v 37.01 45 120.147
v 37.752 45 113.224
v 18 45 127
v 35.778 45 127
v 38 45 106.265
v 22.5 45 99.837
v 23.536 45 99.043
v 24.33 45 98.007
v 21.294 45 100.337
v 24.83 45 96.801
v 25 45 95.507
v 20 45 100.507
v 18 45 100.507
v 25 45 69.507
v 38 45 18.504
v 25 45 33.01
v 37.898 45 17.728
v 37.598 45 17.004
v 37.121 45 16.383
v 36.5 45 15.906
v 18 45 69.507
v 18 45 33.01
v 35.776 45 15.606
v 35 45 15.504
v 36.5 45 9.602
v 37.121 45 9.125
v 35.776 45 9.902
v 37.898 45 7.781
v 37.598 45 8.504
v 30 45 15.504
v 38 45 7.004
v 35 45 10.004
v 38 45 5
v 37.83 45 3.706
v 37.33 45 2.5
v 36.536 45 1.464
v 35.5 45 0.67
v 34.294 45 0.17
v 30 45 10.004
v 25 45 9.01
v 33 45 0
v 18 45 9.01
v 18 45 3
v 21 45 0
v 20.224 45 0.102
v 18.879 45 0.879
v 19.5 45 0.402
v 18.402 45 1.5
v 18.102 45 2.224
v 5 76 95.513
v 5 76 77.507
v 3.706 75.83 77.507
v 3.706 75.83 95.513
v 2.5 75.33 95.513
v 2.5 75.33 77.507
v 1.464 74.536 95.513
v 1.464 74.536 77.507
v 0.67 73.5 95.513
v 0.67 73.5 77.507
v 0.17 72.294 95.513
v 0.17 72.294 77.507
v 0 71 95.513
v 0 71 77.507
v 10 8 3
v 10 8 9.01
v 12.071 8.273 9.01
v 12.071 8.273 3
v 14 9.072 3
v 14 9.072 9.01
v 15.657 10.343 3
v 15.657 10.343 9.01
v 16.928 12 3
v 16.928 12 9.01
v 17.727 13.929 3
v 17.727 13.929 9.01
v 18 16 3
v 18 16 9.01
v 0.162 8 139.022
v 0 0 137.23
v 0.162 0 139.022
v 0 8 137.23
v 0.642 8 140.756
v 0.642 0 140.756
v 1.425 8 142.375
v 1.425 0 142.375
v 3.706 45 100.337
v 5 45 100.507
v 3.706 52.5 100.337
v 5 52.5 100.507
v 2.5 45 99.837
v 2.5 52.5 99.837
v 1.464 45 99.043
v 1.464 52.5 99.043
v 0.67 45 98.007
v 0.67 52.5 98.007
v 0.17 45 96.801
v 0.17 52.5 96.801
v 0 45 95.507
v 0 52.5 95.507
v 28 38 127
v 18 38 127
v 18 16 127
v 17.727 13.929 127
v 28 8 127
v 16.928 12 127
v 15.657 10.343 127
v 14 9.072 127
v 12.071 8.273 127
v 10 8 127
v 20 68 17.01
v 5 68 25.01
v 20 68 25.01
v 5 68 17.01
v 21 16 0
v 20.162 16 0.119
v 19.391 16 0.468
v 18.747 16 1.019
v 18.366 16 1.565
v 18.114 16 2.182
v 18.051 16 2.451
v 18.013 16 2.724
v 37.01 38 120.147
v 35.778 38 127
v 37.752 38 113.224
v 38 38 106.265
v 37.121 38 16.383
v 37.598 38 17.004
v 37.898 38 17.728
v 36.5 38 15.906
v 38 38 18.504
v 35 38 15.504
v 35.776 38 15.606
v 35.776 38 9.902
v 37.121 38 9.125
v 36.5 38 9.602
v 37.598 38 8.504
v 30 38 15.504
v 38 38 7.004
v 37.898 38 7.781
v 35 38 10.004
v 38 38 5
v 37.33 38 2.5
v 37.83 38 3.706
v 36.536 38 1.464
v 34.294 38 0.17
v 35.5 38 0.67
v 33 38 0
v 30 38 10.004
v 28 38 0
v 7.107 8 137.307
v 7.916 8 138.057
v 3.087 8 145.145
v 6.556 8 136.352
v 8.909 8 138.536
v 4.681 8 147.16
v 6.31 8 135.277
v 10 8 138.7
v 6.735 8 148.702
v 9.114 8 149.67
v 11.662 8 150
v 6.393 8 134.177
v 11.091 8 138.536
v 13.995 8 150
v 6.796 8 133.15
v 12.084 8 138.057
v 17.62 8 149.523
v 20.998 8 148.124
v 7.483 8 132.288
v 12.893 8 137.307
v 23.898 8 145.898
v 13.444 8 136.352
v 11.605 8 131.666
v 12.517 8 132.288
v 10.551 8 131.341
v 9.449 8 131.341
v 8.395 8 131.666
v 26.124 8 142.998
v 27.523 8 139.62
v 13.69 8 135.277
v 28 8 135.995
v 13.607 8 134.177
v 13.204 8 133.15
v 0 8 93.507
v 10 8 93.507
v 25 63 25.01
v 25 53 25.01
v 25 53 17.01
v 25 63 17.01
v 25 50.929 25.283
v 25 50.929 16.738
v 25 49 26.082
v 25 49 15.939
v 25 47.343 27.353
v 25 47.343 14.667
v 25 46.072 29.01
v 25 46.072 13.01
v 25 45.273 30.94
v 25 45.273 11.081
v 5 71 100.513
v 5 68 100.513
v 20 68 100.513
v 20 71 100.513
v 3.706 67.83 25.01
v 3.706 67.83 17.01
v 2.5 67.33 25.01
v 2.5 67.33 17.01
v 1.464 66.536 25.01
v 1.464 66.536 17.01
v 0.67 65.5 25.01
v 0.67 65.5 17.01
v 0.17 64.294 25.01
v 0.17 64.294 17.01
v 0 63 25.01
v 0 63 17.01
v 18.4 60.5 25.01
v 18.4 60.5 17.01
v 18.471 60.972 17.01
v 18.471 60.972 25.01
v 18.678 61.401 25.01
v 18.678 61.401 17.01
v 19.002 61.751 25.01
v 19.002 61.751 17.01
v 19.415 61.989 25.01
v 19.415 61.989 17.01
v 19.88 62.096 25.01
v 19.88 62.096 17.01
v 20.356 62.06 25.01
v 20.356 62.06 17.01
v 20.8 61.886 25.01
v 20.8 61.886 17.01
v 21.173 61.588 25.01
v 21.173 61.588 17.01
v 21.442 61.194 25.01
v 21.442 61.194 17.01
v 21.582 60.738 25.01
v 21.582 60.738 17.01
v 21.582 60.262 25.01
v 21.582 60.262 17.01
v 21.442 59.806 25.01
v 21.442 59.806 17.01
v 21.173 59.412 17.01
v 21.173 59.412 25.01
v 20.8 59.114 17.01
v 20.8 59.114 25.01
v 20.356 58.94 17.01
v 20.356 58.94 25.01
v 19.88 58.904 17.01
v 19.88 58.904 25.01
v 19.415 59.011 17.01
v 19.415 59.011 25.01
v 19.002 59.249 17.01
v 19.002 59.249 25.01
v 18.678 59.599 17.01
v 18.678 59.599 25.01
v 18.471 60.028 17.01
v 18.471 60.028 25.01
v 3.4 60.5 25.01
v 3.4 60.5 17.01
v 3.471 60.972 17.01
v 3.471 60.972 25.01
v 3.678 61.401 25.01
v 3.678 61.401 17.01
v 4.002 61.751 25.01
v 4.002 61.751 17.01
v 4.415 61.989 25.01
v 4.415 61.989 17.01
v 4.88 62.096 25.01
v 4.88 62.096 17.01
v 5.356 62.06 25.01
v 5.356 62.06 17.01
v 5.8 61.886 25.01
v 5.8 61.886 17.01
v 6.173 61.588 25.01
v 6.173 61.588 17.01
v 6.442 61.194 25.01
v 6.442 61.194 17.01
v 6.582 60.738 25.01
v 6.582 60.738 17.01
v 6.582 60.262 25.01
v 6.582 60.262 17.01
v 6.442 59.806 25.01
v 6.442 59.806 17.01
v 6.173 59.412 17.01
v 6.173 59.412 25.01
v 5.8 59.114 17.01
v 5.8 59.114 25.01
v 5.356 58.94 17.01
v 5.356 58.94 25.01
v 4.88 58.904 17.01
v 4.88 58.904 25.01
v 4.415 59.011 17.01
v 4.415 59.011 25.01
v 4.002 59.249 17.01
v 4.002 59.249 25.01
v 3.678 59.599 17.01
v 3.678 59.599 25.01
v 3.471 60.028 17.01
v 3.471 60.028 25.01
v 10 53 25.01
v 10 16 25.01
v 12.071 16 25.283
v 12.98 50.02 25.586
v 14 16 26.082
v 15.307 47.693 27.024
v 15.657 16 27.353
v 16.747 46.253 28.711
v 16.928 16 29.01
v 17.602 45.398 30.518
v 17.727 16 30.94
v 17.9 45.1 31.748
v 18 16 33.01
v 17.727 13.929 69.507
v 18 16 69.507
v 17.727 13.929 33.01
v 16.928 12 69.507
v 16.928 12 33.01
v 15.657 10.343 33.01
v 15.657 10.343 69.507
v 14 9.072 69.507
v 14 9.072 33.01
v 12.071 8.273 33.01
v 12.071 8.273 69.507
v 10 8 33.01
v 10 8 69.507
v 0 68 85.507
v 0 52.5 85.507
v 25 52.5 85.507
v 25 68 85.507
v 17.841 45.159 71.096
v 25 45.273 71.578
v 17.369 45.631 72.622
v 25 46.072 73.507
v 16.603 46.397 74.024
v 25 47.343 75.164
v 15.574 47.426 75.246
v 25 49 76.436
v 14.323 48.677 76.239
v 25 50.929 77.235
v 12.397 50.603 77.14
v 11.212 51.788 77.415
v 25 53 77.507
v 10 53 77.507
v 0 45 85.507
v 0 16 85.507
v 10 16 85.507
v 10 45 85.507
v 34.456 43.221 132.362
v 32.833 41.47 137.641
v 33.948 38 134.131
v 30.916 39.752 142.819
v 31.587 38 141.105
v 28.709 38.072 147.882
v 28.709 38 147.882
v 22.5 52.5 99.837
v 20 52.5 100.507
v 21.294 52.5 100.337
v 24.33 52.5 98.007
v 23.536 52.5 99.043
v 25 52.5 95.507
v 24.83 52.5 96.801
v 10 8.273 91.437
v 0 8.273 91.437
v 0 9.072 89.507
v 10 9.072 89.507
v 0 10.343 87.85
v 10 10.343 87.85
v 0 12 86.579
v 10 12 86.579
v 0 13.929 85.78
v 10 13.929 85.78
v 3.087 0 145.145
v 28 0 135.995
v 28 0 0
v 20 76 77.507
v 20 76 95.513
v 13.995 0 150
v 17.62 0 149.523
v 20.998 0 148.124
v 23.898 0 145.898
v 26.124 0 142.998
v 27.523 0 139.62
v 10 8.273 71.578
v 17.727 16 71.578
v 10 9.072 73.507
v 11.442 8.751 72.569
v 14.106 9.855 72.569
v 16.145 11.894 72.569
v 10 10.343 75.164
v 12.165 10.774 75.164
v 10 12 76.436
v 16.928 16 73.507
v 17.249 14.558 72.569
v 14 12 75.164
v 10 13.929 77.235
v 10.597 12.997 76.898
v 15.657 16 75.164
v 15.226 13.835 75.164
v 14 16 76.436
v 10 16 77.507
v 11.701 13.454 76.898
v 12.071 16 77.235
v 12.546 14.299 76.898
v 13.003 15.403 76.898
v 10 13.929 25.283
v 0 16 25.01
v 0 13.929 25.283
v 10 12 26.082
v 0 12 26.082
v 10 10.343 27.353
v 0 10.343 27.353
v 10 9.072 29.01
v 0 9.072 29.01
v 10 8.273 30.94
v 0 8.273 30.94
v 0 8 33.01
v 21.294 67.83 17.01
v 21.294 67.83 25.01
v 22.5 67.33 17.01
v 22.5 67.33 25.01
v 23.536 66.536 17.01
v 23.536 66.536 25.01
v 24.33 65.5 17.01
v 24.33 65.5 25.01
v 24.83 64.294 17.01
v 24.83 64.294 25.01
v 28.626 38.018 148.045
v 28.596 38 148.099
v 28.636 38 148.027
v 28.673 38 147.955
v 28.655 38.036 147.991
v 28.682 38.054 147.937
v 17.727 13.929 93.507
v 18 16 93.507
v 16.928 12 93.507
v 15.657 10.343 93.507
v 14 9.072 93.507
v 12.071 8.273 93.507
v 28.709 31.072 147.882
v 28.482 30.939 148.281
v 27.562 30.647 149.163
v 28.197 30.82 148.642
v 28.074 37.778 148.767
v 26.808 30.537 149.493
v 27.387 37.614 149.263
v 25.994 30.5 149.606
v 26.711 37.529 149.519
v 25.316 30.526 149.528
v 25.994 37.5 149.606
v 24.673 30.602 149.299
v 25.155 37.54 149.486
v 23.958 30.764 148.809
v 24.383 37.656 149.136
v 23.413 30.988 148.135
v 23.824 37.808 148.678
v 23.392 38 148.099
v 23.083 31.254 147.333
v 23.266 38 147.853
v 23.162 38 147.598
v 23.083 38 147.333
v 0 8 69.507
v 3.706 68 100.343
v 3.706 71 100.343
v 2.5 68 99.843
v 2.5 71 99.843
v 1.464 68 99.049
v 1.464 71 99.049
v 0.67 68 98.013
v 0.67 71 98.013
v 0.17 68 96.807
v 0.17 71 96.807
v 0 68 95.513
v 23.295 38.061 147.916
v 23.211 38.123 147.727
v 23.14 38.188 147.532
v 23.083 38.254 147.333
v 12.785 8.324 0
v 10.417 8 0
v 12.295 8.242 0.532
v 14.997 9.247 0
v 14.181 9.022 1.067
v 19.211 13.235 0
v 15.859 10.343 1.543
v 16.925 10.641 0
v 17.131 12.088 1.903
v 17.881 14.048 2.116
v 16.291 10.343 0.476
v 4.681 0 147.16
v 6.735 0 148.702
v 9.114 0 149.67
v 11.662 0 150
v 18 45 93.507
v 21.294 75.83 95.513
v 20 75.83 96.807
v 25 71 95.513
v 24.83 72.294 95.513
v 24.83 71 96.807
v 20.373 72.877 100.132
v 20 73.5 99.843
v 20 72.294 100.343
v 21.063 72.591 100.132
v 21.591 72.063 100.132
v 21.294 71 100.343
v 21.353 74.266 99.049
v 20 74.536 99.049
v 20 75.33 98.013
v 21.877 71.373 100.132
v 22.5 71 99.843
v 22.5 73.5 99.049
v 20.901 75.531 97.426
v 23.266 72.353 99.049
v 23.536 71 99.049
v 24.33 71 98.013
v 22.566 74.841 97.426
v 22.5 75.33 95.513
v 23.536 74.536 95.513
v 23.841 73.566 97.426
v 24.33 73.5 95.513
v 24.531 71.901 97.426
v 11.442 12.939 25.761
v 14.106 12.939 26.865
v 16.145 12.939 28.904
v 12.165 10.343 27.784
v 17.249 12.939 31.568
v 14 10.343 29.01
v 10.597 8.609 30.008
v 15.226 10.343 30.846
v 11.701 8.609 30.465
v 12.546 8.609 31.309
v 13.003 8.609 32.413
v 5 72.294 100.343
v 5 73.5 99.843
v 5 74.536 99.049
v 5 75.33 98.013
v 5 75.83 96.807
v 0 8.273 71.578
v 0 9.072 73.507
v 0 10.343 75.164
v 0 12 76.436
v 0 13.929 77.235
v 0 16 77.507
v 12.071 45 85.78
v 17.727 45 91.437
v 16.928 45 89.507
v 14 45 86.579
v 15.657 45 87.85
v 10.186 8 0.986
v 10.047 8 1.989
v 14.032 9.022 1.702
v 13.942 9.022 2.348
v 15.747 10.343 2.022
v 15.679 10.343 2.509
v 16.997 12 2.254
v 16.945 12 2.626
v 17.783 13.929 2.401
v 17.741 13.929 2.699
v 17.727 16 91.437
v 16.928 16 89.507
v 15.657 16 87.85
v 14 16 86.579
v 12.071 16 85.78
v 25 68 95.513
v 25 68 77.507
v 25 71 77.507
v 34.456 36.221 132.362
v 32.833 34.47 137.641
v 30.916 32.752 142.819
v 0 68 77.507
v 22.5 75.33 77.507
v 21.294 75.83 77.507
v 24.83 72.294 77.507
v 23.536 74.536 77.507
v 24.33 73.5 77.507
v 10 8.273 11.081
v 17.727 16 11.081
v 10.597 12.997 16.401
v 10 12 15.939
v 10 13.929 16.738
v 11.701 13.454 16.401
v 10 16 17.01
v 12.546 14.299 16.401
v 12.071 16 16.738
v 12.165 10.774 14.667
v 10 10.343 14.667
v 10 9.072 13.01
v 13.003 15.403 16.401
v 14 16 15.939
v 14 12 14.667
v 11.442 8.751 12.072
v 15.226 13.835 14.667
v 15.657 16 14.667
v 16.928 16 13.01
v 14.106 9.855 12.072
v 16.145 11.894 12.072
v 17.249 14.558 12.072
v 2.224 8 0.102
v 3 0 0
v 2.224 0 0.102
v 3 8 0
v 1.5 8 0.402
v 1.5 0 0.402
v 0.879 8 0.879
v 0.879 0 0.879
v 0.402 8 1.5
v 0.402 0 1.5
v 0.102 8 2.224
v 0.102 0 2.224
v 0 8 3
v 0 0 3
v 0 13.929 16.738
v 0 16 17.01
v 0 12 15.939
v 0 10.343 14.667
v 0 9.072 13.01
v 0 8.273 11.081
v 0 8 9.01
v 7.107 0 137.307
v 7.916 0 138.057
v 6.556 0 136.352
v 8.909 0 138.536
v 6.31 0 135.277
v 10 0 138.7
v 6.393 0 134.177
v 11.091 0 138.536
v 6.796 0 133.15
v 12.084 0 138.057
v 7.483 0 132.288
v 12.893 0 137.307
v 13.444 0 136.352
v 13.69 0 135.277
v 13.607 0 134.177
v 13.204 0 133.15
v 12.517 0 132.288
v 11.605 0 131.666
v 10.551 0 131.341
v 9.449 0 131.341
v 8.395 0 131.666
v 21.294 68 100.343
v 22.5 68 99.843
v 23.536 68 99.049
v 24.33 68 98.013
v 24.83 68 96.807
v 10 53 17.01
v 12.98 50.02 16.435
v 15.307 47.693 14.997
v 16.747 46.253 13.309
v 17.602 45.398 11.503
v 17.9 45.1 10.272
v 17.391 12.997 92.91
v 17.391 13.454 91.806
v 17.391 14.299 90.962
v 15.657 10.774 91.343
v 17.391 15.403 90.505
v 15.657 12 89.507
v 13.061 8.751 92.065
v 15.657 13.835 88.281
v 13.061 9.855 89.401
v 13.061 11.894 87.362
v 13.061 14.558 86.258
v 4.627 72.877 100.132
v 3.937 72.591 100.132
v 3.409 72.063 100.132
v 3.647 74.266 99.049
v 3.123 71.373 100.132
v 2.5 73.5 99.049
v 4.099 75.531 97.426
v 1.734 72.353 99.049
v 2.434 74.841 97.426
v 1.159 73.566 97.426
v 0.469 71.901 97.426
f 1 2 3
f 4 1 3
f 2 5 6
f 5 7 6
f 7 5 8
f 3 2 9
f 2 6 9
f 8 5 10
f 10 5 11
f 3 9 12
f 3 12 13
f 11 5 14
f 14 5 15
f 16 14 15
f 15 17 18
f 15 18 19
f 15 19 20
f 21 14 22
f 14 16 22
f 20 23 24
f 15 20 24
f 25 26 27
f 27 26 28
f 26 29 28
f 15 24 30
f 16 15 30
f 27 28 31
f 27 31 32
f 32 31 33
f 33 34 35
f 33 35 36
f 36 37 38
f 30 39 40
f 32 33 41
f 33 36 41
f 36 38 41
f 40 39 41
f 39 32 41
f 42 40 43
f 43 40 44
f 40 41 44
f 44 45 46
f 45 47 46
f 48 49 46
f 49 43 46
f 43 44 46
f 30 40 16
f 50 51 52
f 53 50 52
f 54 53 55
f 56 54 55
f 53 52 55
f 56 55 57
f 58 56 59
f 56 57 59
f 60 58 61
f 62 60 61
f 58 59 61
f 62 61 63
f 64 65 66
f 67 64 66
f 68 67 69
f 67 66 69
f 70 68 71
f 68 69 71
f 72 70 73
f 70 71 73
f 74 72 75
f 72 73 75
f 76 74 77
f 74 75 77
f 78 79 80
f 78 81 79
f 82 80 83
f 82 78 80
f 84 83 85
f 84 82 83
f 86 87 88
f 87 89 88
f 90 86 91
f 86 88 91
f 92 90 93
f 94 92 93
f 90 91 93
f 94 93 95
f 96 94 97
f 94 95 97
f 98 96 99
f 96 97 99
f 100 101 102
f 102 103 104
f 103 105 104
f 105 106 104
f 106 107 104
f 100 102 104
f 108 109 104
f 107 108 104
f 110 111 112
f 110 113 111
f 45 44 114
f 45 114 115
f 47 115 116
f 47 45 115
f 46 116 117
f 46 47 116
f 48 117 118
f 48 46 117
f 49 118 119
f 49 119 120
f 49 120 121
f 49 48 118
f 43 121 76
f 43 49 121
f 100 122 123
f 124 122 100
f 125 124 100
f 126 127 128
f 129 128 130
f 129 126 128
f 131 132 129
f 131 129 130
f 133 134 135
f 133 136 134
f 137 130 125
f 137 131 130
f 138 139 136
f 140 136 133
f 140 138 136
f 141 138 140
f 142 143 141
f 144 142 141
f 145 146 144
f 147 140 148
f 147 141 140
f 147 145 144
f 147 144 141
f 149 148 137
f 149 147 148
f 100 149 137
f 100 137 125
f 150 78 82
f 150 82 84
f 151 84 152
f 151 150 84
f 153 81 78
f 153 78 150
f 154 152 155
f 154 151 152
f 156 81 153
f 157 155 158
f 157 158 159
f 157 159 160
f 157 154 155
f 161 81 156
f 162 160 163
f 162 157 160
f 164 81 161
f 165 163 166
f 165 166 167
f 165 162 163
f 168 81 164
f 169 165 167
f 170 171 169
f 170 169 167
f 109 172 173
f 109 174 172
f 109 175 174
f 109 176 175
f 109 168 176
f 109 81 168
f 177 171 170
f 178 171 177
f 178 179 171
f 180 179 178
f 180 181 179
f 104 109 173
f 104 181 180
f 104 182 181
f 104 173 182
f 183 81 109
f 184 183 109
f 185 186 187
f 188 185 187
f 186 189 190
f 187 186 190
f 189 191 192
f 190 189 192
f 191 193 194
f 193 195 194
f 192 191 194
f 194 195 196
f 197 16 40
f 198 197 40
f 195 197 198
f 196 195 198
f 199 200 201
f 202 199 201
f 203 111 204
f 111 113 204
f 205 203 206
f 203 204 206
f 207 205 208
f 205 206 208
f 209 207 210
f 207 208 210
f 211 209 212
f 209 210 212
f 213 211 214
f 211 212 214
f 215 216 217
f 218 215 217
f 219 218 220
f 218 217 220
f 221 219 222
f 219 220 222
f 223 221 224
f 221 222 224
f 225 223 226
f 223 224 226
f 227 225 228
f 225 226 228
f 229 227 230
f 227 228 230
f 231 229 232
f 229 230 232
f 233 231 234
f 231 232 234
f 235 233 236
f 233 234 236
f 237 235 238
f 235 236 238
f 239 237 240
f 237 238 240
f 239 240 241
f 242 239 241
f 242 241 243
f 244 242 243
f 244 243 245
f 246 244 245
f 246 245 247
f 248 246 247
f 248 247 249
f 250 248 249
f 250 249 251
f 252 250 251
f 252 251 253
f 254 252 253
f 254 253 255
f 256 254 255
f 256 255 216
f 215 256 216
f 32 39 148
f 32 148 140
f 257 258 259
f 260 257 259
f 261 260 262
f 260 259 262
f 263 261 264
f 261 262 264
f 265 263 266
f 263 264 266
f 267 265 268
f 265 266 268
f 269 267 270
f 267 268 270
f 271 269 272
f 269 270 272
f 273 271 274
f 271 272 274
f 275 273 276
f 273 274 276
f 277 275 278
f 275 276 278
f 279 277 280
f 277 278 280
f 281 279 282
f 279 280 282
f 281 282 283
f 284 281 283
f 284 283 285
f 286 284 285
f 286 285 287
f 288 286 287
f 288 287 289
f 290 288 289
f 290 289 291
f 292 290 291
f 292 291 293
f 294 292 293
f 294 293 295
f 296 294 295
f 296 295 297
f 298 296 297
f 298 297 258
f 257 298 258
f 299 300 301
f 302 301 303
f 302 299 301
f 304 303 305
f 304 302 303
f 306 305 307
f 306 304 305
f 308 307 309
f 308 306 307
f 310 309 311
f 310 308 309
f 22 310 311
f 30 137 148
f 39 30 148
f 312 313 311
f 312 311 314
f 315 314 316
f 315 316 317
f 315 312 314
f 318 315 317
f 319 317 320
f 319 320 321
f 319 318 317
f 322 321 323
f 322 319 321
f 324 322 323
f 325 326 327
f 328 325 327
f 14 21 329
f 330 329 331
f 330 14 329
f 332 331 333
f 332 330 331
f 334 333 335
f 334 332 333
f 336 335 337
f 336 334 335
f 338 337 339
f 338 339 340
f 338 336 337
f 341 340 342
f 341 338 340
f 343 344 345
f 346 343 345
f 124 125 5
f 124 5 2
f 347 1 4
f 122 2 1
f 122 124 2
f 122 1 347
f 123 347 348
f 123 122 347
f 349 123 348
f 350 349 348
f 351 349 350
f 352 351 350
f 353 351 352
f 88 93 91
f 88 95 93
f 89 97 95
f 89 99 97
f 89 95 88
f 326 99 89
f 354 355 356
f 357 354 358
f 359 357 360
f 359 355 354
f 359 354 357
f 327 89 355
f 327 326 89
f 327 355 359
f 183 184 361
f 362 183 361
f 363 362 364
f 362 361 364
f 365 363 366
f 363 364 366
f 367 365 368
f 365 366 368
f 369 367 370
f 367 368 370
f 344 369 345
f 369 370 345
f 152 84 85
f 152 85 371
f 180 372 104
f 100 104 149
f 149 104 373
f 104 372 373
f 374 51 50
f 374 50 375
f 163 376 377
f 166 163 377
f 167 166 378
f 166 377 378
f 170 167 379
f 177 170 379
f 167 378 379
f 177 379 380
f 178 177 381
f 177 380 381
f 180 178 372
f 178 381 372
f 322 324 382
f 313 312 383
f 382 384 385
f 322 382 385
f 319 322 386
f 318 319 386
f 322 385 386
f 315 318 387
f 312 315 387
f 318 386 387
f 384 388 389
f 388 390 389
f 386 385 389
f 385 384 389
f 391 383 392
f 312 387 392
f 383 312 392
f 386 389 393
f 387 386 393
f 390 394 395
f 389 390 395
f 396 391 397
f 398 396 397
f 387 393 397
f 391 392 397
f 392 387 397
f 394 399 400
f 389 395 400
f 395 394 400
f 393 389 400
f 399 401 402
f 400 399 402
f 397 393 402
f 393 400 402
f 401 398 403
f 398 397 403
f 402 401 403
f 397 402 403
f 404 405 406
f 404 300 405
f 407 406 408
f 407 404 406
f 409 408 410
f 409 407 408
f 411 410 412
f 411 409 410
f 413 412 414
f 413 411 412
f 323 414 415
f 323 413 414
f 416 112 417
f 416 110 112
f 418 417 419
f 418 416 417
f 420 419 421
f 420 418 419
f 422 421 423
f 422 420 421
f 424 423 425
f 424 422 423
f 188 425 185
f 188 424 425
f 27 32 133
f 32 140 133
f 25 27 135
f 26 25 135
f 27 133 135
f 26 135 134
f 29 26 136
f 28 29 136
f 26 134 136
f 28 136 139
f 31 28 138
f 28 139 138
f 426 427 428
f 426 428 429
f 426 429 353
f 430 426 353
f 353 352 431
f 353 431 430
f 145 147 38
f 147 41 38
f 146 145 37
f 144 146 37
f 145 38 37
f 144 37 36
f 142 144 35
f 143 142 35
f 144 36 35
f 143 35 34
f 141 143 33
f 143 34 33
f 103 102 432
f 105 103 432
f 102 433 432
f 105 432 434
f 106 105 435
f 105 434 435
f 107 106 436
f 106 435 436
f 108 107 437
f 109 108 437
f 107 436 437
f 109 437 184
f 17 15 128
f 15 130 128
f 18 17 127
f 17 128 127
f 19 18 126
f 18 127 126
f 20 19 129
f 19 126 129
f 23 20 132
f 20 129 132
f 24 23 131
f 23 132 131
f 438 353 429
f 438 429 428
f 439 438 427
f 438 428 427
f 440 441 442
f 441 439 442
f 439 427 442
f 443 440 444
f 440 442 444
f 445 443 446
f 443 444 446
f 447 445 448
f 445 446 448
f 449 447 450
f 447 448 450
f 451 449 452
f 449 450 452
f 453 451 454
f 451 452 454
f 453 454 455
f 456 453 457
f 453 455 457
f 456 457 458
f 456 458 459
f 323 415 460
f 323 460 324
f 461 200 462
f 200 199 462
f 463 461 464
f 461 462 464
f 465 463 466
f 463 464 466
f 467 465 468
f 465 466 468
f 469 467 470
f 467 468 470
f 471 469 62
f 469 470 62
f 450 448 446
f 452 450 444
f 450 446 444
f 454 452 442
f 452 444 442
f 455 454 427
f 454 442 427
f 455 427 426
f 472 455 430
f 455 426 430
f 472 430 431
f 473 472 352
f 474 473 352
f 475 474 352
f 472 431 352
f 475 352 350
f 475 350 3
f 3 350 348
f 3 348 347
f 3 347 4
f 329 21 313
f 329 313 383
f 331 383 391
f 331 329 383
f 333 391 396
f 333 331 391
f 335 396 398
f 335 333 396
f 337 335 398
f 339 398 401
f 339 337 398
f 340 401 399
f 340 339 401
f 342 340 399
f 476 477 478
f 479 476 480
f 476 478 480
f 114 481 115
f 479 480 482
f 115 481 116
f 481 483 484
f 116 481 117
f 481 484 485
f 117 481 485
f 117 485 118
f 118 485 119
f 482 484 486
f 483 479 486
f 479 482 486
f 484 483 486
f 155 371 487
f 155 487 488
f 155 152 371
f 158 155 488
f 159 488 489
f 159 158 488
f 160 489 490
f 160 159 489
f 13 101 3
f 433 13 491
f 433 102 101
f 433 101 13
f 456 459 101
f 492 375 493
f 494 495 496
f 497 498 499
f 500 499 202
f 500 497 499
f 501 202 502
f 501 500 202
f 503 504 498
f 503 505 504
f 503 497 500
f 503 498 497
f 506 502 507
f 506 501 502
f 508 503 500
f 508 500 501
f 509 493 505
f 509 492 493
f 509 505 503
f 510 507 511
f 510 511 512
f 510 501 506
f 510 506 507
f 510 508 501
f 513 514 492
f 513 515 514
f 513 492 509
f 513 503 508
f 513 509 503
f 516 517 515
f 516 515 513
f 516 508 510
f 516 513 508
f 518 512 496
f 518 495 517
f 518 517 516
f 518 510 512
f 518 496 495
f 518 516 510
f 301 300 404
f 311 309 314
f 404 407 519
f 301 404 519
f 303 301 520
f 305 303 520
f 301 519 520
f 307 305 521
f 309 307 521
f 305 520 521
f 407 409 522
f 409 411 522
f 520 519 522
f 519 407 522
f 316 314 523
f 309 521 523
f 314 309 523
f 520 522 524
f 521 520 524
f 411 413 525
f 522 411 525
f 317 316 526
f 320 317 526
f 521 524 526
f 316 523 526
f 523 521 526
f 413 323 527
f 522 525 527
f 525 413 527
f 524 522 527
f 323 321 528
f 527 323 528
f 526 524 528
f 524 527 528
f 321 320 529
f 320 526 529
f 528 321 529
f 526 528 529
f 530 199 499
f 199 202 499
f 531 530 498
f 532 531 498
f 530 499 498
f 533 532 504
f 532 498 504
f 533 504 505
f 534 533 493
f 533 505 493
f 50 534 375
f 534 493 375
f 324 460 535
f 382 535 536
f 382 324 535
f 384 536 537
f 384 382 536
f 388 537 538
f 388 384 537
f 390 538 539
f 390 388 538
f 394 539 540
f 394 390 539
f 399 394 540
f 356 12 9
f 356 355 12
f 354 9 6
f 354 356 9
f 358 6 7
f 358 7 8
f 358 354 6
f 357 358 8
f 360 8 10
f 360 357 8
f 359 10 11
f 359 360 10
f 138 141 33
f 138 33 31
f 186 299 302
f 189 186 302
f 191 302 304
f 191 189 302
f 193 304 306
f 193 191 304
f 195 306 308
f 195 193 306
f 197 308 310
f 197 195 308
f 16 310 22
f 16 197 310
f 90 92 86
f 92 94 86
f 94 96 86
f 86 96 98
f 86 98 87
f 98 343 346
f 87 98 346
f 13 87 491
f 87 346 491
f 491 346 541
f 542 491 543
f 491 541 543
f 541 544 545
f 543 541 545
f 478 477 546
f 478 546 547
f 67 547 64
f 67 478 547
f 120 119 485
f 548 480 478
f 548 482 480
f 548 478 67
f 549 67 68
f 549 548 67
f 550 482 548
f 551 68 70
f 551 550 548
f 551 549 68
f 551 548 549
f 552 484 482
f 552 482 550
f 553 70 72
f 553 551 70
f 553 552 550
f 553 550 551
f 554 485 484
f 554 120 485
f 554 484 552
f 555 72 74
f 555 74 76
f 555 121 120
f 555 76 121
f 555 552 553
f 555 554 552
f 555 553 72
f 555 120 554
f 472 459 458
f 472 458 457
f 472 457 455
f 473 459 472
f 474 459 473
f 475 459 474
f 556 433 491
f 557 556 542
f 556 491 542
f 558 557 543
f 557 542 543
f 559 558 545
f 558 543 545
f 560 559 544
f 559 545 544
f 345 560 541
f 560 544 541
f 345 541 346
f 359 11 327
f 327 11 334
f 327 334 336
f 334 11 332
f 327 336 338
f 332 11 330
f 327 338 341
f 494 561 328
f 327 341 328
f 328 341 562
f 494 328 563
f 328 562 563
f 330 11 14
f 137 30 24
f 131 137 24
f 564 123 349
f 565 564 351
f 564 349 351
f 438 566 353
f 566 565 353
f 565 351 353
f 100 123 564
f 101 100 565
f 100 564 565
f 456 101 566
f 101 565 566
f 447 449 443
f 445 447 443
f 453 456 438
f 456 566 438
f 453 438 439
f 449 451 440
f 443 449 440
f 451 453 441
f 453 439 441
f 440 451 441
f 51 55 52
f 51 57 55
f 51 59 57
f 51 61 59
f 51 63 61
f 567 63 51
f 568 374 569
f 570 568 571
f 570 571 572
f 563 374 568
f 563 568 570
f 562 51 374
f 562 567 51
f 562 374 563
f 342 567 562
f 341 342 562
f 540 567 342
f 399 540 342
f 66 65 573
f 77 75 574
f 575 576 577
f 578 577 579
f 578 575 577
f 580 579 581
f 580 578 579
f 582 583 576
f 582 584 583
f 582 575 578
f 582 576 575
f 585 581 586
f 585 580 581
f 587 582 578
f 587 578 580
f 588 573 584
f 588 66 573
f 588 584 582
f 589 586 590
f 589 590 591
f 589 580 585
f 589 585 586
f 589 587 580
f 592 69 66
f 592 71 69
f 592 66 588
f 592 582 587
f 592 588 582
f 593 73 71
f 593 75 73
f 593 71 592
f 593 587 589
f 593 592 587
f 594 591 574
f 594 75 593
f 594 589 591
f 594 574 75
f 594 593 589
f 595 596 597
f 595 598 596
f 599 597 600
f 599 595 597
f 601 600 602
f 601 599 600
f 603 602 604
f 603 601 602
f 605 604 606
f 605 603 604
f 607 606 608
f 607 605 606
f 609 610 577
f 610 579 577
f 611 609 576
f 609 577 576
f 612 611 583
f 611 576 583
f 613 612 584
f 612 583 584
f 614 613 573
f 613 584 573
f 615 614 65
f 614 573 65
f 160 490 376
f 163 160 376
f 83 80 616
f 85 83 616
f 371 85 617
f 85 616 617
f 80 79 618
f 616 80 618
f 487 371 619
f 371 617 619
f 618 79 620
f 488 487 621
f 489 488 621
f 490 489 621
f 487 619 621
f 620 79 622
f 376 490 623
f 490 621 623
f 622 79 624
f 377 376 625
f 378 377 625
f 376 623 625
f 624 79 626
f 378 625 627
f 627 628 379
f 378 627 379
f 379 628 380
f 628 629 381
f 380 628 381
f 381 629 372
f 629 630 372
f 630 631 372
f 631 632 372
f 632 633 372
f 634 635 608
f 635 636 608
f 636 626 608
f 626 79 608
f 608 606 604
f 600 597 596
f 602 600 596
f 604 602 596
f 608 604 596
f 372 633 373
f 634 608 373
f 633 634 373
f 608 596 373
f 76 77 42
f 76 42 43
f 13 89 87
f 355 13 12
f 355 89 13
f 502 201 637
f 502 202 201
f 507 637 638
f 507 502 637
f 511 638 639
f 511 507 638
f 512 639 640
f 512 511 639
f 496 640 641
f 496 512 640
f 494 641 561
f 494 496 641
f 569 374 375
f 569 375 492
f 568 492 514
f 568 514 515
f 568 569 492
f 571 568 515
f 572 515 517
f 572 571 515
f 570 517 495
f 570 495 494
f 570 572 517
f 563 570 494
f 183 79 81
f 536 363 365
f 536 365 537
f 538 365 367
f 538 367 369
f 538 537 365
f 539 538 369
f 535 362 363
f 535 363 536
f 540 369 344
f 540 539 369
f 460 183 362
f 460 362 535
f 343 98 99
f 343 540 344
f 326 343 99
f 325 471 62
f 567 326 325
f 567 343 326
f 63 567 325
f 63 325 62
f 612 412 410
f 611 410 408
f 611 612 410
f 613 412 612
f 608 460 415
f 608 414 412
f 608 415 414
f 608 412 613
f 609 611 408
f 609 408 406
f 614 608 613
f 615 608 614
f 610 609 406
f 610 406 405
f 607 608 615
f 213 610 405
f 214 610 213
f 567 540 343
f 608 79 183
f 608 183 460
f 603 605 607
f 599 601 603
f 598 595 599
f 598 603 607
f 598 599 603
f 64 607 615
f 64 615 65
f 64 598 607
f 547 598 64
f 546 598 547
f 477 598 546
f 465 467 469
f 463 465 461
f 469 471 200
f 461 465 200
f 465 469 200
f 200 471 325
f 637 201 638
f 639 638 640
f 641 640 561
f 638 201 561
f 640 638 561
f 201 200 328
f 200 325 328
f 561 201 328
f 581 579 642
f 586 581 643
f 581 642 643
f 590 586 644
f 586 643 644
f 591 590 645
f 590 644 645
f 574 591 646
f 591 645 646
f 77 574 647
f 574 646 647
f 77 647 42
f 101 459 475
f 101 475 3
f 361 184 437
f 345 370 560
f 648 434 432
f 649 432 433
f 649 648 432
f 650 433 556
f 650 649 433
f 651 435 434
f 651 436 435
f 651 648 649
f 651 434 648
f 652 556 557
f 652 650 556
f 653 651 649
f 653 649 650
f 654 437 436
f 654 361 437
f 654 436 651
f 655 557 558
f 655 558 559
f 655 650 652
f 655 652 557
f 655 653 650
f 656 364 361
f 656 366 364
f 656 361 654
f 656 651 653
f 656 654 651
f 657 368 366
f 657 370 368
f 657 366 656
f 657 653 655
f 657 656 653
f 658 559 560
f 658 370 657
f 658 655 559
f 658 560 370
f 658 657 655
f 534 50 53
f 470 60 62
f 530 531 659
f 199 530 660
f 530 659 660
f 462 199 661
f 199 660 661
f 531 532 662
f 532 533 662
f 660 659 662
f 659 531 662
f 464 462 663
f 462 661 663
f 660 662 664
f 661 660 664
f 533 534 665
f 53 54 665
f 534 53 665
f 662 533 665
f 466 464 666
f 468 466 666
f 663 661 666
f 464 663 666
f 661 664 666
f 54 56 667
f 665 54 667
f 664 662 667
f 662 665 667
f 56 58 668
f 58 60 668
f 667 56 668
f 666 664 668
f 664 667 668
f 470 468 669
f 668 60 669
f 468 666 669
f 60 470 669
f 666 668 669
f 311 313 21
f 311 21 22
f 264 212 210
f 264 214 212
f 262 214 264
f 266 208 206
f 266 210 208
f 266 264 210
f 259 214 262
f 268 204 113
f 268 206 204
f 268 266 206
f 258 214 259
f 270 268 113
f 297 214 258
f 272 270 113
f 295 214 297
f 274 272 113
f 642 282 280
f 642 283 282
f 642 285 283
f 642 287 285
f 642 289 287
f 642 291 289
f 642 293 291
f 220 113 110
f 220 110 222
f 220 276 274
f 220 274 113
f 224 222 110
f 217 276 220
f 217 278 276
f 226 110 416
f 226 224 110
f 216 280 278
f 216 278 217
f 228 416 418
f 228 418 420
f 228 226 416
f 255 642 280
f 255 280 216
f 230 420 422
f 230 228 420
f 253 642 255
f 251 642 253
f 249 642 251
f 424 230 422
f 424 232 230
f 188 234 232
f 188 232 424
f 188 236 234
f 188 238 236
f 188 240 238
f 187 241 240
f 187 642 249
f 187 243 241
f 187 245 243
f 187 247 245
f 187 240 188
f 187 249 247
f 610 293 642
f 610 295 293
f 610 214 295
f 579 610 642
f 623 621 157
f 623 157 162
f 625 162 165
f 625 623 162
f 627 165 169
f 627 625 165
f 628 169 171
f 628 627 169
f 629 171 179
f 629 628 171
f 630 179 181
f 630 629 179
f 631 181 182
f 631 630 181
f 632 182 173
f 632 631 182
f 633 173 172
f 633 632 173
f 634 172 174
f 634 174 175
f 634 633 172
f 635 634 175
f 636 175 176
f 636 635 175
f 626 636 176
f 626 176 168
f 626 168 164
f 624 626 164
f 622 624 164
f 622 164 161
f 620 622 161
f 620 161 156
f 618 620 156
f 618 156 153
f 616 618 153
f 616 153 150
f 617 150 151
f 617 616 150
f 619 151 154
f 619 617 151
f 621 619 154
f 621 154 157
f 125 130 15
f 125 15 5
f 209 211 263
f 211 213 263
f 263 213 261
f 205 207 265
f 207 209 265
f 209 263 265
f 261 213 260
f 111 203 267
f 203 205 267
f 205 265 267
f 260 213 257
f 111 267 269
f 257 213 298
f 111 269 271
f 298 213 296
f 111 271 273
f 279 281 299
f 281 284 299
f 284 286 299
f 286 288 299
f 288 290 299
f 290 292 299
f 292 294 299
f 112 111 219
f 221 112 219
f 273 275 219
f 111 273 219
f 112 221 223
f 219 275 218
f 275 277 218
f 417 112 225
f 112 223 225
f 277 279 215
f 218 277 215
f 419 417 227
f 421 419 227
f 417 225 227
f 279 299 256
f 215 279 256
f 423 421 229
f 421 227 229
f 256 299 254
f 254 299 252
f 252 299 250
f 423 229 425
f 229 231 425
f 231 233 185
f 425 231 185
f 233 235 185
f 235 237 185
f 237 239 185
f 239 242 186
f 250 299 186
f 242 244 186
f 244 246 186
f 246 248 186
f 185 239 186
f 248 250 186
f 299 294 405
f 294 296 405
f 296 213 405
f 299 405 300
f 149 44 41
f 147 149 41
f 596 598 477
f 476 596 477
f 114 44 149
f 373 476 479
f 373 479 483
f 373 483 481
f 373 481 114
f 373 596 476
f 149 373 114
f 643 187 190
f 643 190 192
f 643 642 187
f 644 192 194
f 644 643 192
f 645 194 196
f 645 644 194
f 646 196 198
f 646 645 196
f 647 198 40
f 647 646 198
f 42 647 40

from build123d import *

# Parameters (mm, degrees)
SKETCH1_R           = 3.7
BOSS_EXTRUDE1_DEPTH = 8
FILLET1_R           = 10
SKETCH2_W           = 10
SKETCH2_H           = 127
BOSS_EXTRUDE2_DEPTH = 30
BOSS_EXTRUDE3_DEPTH = 7
FILLET2_R           = 3
SKETCH4_W           = 18
SKETCH4_H           = 8
BOSS_EXTRUDE4_DEPTH = 27
SKETCH5_W           = 25
SKETCH5_H           = 8
BOSS_EXTRUDE5_DEPTH = 33
SKETCH6_W           = 25
SKETCH6_H           = 23.005701243
BOSS_EXTRUDE6_DEPTH = 8
SKETCH7_W           = 25
SKETCH7_H           = 7.5
BOSS_EXTRUDE7_DEPTH = 15
CUT_EXTRUDE1_REACH  = 159.817
SKETCH8_R           = 1.6
FILLET3_R           = 8
FILLET4_R           = 5
CUT_EXTRUDE2_REACH  = 163.149
SKETCH9_W           = 8
SKETCH9_H           = 5.5
FILLET7_R           = 3
BOSS_EXTRUDE8_DEPTH = 10
CUT_EXTRUDE3_START  = -17.777833
CUT_EXTRUDE3_DEPTH  = 17.777833


with BuildPart() as part:
    # Sketch1 → Boss-Extrude1 (new body)
    with BuildSketch(Plane(origin=(0, 0, 0), x_dir=(1, 0, 0), z_dir=(0, 1, 0))):
        with BuildLine():
            Line((0, 0), (0, -140))
            Line((0, -140), (6, -150))
            Line((6, -150), (13.995477091, -150))
            ThreePointArc((13.995477091, -150), (23.898170207, -145.898170207), (28, -135.995477091))
            Line((28, -135.995477091), (28, 0))
            Line((28, 0), (0, 0))
        make_face()
        with Locations(Location((10, -135, 0), (0, 0, 270))):
            Circle(SKETCH1_R, mode=Mode.SUBTRACT)
    extrude(amount=BOSS_EXTRUDE1_DEPTH)

    # Fillet1
    fillet1_edges = [part.edges().sort_by_distance(p)[0] for p in [
        (6, 4, 150),
        (0, 4, 140),
    ]]
    fillet(fillet1_edges, radius=FILLET1_R)

    # Sketch2 → Boss-Extrude2 (add)
    with BuildSketch(Plane(origin=(0, 8, 0), x_dir=(1, 0, 0), z_dir=(0, 1, 0))):
        with Locations((23, -63.5)):
            Rectangle(SKETCH2_W, SKETCH2_H)
    extrude(amount=BOSS_EXTRUDE2_DEPTH)

    # Sketch3 → Boss-Extrude3 (add)
    with BuildSketch(Plane(origin=(0, 38, 0), x_dir=(1, 0, 0), z_dir=(0, 1, 0))):
        with BuildLine():
            Line((18, 0), (38, 0))
            Line((38, 0), (38, -106.265006005))
            ThreePointArc((38, -106.265006005), (34.694156342, -131.484540297), (25, -155))
            Line((25, -155), (18, -127))
            Line((18, -127), (18, 0))
        make_face()
    extrude(amount=BOSS_EXTRUDE3_DEPTH)

    # Fillet2
    fillet2_edges = [part.edges().sort_by_distance(p)[0] for p in [
        (0, 4, 0),
        (18, 26.5, 0),
        (25, 41.5, 155),
    ]]
    fillet(fillet2_edges, radius=FILLET2_R)

    # Sketch4 → Boss-Extrude4 (add)
    with BuildSketch(Plane(origin=(0, 8, 0), x_dir=(1, 0, 0), z_dir=(0, 1, 0))):
        with Locations((9, -21.010298757)):
            Rectangle(SKETCH4_W, SKETCH4_H)
        with Locations((9, -81.507298757)):
            Rectangle(SKETCH4_W, SKETCH4_H)
    extrude(amount=BOSS_EXTRUDE4_DEPTH)

    # Sketch5 → Boss-Extrude5 (add)
    with BuildSketch(Plane(origin=(0, 35, 0), x_dir=(1, 0, 0), z_dir=(0, 1, 0))):
        with Locations((12.5, -21.010298757)):
            Rectangle(SKETCH5_W, SKETCH5_H)
        with Locations((12.5, -81.507298757)):
            Rectangle(SKETCH5_W, SKETCH5_H)
    extrude(amount=BOSS_EXTRUDE5_DEPTH)

    # Sketch6 → Boss-Extrude6 (add)
    with BuildSketch(Plane(origin=(0, 68, 0), x_dir=(1, 0, 0), z_dir=(0, 1, 0))):
        with Locations((12.5, -89.010149379)):
            Rectangle(SKETCH6_W, SKETCH6_H)
    extrude(amount=BOSS_EXTRUDE6_DEPTH)

    # Sketch7 → Boss-Extrude7 (add)
    with BuildSketch(Plane.XY.offset(85.507298757)):
        with Locations((12.5, 48.75)):
            Rectangle(SKETCH7_W, SKETCH7_H)
    extrude(amount=BOSS_EXTRUDE7_DEPTH)

    # Sketch8 → Cut-Extrude1 (cut, up to next)
    with BuildSketch(Plane(origin=(0, 0, 17.010298757), x_dir=(-1, 0, 0), z_dir=(0, 0, -1)), mode=Mode.PRIVATE) as cut_extrude1_sk1:
        with Locations((-20, 60.5)):
            Circle(SKETCH8_R)
    cut_extrude1_tool1 = extrude(cut_extrude1_sk1.sketch, amount=-CUT_EXTRUDE1_REACH, mode=Mode.PRIVATE) & part.part
    # Sketch8 → Cut-Extrude1 (cut, up to next)
    with BuildSketch(Plane(origin=(0, 0, 17.010298757), x_dir=(-1, 0, 0), z_dir=(0, 0, -1)), mode=Mode.PRIVATE) as cut_extrude1_sk2:
        with Locations((-5, 60.5)):
            Circle(SKETCH8_R)
    cut_extrude1_tool2 = extrude(cut_extrude1_sk2.sketch, amount=-CUT_EXTRUDE1_REACH, mode=Mode.PRIVATE) & part.part
    add(cut_extrude1_tool1.solids().sort_by_distance((20, 60.5, 17.010299))[0], mode=Mode.SUBTRACT)
    add(cut_extrude1_tool2.solids().sort_by_distance((5, 60.5, 17.010299))[0], mode=Mode.SUBTRACT)

    # Fillet3
    fillet3_edges = [part.edges().sort_by_distance(p)[0] for p in [
        (18.878679656, 8, 0.878679656),
        (18, 8, 10.005149379),
    ]]
    fillet(fillet3_edges, radius=FILLET3_R)
    fillet3_2_edges = [part.edges().sort_by_distance(p)[0] for p in [
        (5, 8, 17.010298757),
    ]]
    fillet(fillet3_2_edges, radius=FILLET3_R)
    fillet3_3_edges = [part.edges().sort_by_distance(p)[0] for p in [
        (21.5, 45, 17.010298757),
    ]]
    fillet(fillet3_3_edges, radius=FILLET3_R)
    fillet3_4_edges = [part.edges().sort_by_distance(p)[0] for p in [
        (18, 26.5, 25.010298757),
    ]]
    fillet(fillet3_4_edges, radius=FILLET3_R)
    fillet3_5_edges = [part.edges().sort_by_distance(p)[0] for p in [
        (5, 8, 25.010298757),
    ]]
    fillet(fillet3_5_edges, radius=FILLET3_R)
    fillet3_6_edges = [part.edges().sort_by_distance(p)[0] for p in [
        (21.5, 45, 25.010298757),
    ]]
    fillet(fillet3_6_edges, radius=FILLET3_R)
    fillet3_7_edges = [part.edges().sort_by_distance(p)[0] for p in [
        (5, 8, 77.507298757),
    ]]
    fillet(fillet3_7_edges, radius=FILLET3_R)
    fillet3_8_edges = [part.edges().sort_by_distance(p)[0] for p in [
        (21.5, 45, 77.507298757),
    ]]
    fillet(fillet3_8_edges, radius=FILLET3_R)
    fillet3_9_edges = [part.edges().sort_by_distance(p)[0] for p in [
        (9, 8, 85.507298757),
    ]]
    fillet(fillet3_9_edges, radius=FILLET3_R)
    fillet3_10_edges = [part.edges().sort_by_distance(p)[0] for p in [
        (18, 30.5, 85.507298757),
    ]]
    fillet(fillet3_10_edges, radius=FILLET3_R)

    # Fillet4
    fillet4_edges = [part.edges().sort_by_distance(p)[0] for p in [
        (38, 41.5, 0),
        (25, 68, 21.010298757),
        (25, 76, 89.010149379),
        (0, 76, 89.010149379),
        (0, 68, 21.010298757),
        (12.5, 76, 100.513),
        (25, 72, 100.513),
        (0, 72, 100.513),
        (25, 48.75, 100.507298757),
        (0, 48.75, 100.507298757),
    ]]
    fillet(fillet4_edges, radius=FILLET4_R)

    # Sketch9 → Cut-Extrude2 (cut, up to next)
    with BuildSketch(Plane(origin=(0, 45, 0), x_dir=(1, 0, 0), z_dir=(0, 1, 0)), mode=Mode.PRIVATE) as cut_extrude2_sk1:
        with Locations((34, -12.754149379)):
            Rectangle(SKETCH9_W, SKETCH9_H)
    cut_extrude2_tool1 = extrude(cut_extrude2_sk1.sketch, amount=-CUT_EXTRUDE2_REACH, mode=Mode.PRIVATE) & part.part
    add(cut_extrude2_tool1.solids().sort_by_distance((34, 45, 12.754149))[0], mode=Mode.SUBTRACT)

    # Fillet7
    fillet7_edges = [part.edges().sort_by_distance(p)[0] for p in [
        (38, 41.5, 10.004149379),
        (38, 41.5, 15.504149379),
    ]]
    fillet(fillet7_edges, radius=FILLET7_R)

    # Sketch10 → Boss-Extrude8 (add)
    with BuildSketch(Plane.XZ.offset(-38)):
        with BuildLine():
            Line((18, 127), (28, 127))
            Line((28, 127), (35.777833095, 127))
            ThreePointArc((35.777833095, 127), (32.833324538, 137.640533241), (28.708897726, 147.881635807))
            ThreePointArc((28.708897726, 147.881635807), (25.702724236, 149.591554326), (23.08332777, 147.333311082))
            Line((23.08332777, 147.333311082), (18, 127))
        make_face()
    extrude(amount=BOSS_EXTRUDE8_DEPTH)

    # Sketch11 → Cut-Extrude3 (cut)
    with BuildSketch(Plane.ZY.offset(-18).offset(CUT_EXTRUDE3_START)):
        Polygon((127, 28), (127, 38), (149.605704206, 30.5), (149.605704206, 28), align=None)
        Polygon((149.605704206, 45), (149.605704206, 37.5), (127, 45), align=None)
    extrude(amount=CUT_EXTRUDE3_DEPTH, mode=Mode.SUBTRACT)


solid = part.part
